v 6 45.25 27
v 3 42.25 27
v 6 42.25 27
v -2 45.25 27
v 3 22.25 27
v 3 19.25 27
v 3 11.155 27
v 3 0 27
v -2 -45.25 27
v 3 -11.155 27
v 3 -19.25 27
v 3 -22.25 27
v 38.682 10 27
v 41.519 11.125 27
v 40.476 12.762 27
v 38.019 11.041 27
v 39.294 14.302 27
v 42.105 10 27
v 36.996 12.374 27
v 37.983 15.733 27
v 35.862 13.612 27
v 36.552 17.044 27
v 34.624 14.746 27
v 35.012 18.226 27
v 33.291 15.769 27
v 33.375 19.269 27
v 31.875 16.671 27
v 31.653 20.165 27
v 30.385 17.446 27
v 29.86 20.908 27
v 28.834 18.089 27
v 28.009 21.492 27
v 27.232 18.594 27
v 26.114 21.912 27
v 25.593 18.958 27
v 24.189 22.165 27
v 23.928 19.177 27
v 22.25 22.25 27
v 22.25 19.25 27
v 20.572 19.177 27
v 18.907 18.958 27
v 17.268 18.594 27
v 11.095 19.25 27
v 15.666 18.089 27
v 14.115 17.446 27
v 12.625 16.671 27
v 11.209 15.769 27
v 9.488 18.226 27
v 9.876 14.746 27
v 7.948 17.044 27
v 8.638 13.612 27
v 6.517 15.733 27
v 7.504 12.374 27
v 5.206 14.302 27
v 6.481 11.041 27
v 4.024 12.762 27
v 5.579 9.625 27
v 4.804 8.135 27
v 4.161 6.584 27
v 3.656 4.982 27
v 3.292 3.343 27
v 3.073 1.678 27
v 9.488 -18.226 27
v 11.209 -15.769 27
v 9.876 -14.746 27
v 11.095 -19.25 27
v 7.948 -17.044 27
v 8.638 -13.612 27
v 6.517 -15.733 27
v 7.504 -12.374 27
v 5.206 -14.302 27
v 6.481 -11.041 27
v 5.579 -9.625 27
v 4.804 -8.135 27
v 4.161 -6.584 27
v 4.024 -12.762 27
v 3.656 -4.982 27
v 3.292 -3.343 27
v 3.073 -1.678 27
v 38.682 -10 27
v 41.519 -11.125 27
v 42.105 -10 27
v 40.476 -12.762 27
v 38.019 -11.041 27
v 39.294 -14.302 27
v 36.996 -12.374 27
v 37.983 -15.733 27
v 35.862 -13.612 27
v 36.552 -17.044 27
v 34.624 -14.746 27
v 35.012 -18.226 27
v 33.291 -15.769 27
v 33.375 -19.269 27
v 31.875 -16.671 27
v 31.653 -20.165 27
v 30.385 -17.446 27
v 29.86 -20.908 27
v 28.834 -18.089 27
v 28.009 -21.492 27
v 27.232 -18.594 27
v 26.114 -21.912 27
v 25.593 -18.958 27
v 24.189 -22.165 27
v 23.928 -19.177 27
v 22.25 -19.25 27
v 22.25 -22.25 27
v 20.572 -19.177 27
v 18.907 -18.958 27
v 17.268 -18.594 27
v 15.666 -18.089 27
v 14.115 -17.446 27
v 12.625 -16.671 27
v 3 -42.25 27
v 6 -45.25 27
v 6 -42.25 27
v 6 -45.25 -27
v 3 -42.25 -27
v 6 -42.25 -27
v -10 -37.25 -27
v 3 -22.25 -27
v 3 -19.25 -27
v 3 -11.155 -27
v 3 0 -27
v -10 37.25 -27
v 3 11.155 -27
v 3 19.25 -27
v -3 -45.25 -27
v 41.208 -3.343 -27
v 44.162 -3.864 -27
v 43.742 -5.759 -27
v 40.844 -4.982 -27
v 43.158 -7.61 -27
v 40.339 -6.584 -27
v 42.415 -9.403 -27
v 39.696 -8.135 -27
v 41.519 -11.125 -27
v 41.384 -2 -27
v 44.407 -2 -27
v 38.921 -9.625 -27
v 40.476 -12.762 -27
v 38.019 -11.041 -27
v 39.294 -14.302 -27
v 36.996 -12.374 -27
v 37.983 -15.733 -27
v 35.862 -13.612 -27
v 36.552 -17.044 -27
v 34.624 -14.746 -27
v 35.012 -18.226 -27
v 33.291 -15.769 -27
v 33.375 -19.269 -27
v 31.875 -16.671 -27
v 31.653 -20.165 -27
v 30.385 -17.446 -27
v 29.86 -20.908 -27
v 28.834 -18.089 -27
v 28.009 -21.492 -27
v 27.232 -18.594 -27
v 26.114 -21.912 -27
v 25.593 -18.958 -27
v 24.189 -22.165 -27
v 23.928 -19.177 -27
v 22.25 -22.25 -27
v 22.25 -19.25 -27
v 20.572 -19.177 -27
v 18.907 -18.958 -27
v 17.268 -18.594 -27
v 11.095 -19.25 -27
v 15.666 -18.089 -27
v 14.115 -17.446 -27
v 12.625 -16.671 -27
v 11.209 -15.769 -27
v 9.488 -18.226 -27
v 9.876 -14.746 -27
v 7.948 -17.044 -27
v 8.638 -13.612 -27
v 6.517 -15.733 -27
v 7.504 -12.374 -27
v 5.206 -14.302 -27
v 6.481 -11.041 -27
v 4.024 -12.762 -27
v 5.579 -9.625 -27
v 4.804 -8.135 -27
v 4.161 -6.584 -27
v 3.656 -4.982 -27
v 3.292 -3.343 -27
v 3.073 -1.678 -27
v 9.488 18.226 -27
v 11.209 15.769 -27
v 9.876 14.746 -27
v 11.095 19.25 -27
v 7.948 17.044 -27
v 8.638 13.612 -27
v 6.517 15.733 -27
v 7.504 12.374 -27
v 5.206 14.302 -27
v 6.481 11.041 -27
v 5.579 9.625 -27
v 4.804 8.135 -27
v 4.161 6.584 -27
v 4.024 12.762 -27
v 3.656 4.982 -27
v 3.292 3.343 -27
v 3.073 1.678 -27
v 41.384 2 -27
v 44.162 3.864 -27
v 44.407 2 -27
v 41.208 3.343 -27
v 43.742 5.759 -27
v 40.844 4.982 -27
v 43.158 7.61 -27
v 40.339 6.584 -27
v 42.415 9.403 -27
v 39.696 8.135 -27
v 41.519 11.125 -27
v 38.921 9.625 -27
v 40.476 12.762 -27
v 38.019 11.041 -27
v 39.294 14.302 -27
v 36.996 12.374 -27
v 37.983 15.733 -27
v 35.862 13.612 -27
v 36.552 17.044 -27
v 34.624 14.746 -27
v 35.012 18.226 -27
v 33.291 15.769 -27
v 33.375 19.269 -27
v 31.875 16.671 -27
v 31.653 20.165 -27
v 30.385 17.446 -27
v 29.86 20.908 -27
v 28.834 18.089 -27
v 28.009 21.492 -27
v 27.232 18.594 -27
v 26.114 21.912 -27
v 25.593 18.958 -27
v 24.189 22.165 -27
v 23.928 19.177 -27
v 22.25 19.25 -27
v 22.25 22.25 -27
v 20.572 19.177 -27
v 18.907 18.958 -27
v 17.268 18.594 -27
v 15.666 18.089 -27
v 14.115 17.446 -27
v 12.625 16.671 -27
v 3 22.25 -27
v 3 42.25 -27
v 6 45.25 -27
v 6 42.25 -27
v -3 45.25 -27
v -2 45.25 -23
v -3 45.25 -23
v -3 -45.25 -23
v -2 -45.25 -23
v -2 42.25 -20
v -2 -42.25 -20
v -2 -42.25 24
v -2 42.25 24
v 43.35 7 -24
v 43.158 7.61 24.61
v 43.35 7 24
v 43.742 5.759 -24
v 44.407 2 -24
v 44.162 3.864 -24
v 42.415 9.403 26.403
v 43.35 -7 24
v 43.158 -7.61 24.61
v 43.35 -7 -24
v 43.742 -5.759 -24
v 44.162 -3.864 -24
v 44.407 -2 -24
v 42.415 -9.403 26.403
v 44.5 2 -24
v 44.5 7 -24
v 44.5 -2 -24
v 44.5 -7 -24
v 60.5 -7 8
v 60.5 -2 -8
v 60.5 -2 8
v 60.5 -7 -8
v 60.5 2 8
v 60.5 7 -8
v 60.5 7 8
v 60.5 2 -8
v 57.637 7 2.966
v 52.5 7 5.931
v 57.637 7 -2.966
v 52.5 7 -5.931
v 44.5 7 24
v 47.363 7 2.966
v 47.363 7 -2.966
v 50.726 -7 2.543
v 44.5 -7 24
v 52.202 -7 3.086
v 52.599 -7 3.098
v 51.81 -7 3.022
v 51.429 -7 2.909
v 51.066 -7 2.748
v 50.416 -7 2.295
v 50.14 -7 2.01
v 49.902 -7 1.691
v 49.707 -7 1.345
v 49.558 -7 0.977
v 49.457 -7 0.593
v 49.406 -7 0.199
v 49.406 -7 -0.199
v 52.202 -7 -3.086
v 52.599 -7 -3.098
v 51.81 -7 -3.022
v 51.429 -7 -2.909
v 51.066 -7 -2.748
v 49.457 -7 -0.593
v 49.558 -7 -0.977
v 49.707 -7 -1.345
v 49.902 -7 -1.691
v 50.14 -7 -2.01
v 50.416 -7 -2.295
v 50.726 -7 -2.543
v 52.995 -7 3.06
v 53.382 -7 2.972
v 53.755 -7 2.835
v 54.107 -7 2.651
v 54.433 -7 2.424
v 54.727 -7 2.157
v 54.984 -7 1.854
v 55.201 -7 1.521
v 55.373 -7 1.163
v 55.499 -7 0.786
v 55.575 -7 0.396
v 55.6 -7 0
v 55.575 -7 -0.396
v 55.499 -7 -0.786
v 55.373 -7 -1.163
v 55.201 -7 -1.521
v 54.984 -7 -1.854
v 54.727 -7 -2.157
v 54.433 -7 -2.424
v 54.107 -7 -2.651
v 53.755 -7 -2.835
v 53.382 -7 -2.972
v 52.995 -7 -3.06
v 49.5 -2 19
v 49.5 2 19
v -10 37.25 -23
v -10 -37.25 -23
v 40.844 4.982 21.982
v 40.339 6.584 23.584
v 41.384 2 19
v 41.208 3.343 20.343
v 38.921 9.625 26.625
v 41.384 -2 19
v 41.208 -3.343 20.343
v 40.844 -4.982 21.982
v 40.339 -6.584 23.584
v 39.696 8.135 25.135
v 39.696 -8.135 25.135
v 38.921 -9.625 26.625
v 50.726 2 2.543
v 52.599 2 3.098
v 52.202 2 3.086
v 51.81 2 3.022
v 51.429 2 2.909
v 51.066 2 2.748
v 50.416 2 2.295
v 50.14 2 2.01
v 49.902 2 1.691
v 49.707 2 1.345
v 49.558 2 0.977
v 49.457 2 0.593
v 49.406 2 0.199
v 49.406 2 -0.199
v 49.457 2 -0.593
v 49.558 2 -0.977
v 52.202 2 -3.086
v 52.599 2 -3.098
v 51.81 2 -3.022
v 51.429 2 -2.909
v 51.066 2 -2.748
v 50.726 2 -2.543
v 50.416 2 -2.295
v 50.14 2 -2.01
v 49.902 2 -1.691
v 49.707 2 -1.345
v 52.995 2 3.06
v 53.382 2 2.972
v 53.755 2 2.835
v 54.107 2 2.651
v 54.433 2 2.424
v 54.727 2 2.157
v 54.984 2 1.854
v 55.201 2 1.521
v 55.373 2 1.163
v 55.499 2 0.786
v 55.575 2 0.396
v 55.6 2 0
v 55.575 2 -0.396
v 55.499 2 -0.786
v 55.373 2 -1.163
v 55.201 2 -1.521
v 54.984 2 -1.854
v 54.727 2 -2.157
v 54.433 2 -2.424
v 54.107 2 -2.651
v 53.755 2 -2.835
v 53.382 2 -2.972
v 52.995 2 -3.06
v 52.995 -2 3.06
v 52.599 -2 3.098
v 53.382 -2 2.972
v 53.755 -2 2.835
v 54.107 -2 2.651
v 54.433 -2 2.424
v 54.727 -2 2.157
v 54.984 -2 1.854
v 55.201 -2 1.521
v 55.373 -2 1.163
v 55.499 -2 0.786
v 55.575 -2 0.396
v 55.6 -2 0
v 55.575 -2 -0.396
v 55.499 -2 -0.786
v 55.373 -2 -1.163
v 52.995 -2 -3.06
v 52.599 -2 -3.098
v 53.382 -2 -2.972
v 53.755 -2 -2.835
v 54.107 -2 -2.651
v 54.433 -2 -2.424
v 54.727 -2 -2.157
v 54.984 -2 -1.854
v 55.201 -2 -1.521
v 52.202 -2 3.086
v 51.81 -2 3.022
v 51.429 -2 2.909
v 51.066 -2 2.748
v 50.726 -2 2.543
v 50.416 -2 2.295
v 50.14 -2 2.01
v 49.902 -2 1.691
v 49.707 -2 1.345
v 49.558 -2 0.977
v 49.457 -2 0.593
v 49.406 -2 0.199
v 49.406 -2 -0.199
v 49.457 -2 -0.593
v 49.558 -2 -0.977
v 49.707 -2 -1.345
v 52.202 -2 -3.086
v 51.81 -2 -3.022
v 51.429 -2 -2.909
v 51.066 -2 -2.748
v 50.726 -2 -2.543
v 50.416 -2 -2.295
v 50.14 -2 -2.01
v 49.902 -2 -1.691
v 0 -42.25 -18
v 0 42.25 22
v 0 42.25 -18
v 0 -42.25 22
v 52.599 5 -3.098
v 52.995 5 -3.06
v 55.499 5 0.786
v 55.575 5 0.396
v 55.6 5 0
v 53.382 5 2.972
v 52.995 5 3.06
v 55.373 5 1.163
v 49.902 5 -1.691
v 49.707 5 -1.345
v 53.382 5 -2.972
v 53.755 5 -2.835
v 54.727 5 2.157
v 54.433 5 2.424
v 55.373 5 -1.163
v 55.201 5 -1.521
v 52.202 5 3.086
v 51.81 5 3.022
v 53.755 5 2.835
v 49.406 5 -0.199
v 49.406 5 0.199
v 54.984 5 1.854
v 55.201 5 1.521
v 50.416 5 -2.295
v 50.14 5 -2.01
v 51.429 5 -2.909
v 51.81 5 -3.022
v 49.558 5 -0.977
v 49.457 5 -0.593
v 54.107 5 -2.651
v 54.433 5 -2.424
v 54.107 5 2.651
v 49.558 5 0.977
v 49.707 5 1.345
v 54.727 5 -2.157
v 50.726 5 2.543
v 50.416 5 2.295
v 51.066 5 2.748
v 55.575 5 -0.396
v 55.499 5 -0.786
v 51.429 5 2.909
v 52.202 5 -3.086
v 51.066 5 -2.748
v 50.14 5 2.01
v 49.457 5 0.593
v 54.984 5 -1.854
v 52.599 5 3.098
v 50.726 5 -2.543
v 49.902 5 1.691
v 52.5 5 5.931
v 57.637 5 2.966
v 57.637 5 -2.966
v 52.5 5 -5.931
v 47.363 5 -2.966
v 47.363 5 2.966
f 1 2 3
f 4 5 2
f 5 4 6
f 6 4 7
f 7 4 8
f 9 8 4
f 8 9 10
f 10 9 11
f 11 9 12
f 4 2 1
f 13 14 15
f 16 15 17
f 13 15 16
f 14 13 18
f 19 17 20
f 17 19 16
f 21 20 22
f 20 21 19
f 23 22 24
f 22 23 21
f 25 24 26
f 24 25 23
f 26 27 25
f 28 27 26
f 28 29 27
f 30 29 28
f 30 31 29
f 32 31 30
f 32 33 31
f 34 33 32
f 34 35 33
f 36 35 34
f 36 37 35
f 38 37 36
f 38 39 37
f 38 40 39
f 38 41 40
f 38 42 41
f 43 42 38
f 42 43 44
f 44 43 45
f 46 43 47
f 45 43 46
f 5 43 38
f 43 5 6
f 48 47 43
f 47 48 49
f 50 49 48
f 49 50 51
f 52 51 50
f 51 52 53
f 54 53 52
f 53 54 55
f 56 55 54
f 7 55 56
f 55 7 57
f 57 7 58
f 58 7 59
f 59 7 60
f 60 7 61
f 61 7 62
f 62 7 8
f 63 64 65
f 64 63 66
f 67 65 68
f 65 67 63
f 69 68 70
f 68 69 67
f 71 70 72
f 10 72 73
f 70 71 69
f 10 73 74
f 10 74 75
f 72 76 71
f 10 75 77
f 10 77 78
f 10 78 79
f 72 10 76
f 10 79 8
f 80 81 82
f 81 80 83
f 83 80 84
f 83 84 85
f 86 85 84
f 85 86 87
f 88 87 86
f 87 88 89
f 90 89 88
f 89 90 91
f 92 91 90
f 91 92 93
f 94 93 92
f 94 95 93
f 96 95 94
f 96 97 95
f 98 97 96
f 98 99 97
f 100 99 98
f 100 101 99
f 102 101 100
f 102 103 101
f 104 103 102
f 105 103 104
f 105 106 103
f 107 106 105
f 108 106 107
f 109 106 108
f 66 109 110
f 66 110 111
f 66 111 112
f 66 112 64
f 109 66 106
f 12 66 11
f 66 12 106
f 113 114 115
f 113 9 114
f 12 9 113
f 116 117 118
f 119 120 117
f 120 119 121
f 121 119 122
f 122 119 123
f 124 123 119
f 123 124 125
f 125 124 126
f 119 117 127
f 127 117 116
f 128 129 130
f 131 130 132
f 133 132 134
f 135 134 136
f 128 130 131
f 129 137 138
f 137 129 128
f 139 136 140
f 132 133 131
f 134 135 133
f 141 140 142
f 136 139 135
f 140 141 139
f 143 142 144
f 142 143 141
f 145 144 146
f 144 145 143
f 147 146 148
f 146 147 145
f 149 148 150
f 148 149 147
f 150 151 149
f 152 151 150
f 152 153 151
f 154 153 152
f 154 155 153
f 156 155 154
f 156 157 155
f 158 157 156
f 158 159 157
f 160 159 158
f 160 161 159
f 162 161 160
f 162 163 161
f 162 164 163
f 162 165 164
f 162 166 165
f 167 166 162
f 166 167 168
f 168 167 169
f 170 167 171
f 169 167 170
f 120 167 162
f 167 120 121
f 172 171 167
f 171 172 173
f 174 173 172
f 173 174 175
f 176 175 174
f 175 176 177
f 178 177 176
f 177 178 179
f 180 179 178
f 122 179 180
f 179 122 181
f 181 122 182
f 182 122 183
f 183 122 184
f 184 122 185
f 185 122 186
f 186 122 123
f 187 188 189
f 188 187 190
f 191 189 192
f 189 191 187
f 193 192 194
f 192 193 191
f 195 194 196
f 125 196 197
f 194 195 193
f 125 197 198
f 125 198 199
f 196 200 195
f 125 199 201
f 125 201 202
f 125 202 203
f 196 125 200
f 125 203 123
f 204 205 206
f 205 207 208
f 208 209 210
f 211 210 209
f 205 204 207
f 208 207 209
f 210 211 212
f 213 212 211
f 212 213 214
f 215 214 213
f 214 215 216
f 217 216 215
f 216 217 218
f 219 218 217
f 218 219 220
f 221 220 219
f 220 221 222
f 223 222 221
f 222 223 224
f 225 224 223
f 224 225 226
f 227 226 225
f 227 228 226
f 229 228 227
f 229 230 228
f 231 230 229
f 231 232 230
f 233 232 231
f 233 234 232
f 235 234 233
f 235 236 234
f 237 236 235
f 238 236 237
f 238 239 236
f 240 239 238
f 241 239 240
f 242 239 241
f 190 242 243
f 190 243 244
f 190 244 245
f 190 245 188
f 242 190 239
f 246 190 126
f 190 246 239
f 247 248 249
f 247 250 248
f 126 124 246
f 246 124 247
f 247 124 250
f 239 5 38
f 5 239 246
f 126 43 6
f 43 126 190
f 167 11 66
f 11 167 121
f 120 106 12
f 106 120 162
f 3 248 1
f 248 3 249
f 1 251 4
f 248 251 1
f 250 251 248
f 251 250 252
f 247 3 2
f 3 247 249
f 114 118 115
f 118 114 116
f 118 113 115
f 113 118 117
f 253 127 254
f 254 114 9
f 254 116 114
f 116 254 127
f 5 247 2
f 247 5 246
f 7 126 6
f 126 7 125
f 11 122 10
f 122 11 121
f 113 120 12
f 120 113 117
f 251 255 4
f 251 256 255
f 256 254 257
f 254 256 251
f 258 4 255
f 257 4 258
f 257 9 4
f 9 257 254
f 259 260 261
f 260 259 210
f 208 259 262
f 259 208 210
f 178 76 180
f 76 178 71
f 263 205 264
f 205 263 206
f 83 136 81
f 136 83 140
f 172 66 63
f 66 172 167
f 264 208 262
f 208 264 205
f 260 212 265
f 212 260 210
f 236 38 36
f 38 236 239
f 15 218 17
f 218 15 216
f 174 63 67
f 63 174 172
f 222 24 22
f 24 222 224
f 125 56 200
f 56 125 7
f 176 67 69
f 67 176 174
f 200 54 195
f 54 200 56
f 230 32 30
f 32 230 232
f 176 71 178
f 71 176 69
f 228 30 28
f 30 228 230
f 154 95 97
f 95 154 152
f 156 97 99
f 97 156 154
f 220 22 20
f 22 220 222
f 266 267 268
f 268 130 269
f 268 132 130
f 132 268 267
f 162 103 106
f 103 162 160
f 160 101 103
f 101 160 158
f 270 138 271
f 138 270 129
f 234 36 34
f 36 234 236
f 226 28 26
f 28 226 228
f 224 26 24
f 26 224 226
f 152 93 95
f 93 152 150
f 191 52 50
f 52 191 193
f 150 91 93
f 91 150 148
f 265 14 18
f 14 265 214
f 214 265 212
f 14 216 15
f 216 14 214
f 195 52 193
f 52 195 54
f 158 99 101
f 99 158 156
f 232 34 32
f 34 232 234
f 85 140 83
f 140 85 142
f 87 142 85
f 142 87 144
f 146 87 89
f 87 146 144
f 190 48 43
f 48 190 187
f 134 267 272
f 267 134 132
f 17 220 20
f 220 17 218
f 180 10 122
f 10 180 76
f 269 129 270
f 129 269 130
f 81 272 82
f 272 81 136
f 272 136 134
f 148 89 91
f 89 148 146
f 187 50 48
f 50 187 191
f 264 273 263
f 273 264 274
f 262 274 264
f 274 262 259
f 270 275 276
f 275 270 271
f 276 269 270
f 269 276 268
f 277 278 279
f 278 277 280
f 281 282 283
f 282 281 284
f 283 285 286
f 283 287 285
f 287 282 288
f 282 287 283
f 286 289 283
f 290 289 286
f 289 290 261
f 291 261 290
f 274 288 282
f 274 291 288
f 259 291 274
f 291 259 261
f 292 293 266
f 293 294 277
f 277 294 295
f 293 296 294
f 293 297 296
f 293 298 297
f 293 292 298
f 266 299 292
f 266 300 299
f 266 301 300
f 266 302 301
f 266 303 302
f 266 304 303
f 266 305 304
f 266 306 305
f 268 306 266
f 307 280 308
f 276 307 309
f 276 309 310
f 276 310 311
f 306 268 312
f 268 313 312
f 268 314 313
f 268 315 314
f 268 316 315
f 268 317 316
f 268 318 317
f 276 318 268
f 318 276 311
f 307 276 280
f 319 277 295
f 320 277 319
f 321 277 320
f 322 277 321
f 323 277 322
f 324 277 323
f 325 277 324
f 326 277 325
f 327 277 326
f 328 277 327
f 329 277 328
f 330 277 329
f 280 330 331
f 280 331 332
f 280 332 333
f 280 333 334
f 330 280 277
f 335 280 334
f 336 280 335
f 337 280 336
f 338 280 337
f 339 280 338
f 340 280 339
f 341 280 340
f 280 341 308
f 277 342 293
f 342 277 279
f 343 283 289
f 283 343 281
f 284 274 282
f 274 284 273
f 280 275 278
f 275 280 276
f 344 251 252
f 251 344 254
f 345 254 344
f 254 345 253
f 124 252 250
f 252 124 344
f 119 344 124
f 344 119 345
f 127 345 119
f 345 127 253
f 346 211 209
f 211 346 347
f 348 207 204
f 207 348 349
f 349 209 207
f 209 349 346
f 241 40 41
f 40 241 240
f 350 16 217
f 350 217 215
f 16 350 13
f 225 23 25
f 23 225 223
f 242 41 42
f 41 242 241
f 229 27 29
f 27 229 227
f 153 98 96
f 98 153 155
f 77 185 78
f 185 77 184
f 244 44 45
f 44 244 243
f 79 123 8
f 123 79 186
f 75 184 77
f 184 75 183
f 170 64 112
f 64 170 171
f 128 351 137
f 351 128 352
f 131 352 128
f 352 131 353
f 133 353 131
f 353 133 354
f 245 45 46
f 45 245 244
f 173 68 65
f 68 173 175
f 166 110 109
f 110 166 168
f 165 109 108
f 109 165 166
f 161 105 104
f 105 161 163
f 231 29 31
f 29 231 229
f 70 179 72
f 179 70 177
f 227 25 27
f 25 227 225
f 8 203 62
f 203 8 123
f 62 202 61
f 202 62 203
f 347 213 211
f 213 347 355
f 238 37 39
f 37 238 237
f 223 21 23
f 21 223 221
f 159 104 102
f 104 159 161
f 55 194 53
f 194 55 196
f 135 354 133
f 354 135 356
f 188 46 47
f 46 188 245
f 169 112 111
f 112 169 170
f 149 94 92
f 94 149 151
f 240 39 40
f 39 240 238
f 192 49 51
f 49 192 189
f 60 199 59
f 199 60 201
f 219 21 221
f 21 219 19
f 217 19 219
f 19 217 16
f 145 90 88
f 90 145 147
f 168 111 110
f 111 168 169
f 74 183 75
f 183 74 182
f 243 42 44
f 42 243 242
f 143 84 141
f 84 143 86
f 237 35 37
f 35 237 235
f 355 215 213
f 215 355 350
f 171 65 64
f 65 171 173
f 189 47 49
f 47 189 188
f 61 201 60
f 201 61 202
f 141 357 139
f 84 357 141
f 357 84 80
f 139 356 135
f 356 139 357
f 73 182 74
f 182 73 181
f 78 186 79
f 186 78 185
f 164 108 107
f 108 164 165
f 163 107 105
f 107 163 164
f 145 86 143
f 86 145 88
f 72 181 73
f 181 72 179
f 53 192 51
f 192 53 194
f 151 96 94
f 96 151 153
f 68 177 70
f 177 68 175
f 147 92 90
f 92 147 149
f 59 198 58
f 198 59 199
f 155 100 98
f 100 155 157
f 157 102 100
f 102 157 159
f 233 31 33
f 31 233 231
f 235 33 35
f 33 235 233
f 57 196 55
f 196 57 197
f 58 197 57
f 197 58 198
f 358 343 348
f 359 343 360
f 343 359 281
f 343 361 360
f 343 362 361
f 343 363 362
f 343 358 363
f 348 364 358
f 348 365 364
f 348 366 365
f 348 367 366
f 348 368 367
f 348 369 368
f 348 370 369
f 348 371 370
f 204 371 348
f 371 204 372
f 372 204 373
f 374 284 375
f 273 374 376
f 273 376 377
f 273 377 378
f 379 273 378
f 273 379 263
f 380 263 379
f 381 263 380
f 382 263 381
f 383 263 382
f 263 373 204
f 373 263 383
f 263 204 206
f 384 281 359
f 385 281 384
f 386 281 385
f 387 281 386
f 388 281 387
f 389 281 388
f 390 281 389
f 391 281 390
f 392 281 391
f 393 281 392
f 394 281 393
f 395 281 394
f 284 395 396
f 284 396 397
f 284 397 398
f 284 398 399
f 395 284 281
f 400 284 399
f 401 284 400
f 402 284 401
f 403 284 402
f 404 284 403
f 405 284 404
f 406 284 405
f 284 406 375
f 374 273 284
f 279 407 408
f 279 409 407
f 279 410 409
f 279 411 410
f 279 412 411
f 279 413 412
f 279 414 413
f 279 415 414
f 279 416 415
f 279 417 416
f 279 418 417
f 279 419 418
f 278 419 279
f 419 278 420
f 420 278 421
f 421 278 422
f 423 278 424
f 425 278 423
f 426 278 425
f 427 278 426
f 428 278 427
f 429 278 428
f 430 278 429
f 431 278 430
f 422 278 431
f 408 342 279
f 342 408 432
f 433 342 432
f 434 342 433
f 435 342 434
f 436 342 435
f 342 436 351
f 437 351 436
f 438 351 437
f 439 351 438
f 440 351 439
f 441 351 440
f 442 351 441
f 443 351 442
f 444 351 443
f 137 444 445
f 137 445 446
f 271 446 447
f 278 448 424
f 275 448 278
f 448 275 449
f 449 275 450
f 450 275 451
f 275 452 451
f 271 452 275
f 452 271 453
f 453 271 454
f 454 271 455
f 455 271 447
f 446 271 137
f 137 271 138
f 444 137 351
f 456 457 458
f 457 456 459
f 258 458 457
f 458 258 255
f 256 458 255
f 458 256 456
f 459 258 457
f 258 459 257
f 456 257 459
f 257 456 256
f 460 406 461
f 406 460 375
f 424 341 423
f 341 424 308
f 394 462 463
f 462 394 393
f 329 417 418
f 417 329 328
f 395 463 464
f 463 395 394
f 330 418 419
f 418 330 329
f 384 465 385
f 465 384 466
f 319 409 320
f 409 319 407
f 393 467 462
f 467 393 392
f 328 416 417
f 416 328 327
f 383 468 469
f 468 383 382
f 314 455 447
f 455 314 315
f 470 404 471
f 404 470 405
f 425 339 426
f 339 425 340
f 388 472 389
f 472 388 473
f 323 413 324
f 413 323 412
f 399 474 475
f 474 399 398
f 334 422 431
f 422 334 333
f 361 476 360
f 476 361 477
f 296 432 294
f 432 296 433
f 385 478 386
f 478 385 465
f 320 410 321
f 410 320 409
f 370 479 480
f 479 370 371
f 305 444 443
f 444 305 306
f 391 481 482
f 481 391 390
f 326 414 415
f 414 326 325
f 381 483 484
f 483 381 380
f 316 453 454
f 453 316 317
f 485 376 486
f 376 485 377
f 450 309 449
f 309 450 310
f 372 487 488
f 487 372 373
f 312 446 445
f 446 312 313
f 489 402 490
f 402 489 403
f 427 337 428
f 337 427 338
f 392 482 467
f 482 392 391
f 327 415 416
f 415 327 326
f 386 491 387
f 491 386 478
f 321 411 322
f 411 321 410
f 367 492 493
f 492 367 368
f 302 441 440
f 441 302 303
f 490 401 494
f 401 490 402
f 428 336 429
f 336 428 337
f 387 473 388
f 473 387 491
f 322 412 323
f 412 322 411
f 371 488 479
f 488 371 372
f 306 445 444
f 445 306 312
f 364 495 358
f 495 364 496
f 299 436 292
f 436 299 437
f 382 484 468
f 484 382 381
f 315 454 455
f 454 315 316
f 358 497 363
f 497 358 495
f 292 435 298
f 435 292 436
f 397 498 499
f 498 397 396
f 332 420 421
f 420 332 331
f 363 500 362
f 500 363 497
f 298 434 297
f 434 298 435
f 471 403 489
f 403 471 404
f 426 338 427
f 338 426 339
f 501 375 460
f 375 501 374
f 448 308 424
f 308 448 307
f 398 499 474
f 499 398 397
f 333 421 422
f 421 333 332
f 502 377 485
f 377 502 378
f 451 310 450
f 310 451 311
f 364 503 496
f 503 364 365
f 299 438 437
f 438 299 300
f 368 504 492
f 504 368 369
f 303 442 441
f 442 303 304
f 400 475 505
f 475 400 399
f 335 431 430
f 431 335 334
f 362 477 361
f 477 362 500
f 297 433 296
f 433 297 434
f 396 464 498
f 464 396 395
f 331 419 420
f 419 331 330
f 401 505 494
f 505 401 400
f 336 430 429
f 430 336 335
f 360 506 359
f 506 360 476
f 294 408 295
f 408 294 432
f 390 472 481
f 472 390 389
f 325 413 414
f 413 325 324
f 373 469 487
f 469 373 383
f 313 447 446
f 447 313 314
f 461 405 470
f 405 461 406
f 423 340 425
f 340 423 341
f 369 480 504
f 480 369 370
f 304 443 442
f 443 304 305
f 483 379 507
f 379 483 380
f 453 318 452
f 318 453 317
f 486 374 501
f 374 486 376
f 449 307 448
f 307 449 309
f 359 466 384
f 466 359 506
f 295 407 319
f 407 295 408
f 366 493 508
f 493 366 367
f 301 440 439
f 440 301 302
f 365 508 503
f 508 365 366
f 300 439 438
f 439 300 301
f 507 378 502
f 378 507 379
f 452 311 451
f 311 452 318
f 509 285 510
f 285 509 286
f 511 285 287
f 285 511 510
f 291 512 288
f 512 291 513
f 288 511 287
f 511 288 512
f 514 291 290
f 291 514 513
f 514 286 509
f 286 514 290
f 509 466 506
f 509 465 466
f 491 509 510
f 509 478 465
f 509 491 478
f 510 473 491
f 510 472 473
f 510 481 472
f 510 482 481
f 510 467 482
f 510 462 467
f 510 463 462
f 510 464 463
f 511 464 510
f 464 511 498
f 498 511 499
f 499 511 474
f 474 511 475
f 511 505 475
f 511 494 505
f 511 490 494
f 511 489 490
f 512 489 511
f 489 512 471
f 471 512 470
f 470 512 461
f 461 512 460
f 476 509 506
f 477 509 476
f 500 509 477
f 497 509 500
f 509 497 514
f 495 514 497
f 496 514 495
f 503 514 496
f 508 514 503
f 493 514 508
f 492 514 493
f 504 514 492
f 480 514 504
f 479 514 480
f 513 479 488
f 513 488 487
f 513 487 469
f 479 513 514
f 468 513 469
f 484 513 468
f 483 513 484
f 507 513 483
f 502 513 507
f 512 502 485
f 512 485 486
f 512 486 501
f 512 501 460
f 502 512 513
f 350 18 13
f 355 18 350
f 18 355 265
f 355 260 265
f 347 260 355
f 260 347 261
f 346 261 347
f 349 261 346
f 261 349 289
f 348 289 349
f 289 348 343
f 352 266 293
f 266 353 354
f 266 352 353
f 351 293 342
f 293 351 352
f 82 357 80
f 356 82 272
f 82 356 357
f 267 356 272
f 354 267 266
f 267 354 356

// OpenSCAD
// [FL_INDEX: keywords="openscad, 3d_parametric, Umbrella_Holder_for_Balcony_Railings, csg_solid" | COT="Parametric OpenSCAD design from 3DCodeverse"]
// Title:  Umbrella Holder for Balcony Railings

// 2013 Lukas Süss aka mechadense
// License CC-BY-NC
// Umbrella holder





// Diameter of the umbrellas tube (+0.5mm)
dtube = 38.5;
//38;
rtube = dtube/2;

// Width of the bands used to fixate the holder onto one of the rectangular bars
wband = 20;

// hight of the rectangulat bar on which to mount the holder
sbar0 = 50;

// thickness of hook
shook = 4;

// depth of hook
dhook = 8;

sbar = sbar0+shook;
//50.5

//----

// baseplate thickness
tplate = 3.0;

// tubeholder thickness 
ttubewall = 3.0; // wall thickness of the pipe segment


// width of gap to adjust for tube diameter variations
adjustgap = 4;

// thickness of adjustment brackets
tadjust = 5;
// size of brackets
sadjust = 16;

// width of outer band guides
wrim = 3;

// hight of outer band guides
hrim = 3;


// resolution: minimum facet length
$fs=0.4;
// resolution: maximal facet angle
$fa=5;

// baseplate groovedepth for soft material
tinset = 2;

// total length of part
lges = dtube+2*ttubewall+2*wband+2*wrim;

// screw diameter
dscrew = 6;

// screw clearance
scrclr = 0.2;

// nut or screwhead wrench size
s = 10.1;



difference()
{
  union()
  {
    //Baseplate
    translate([tplate/2-tinset/2,0,0*sbar/2])
    cube([tplate+tinset,lges,sbar],center=true);
 
    //Tubeholder Basebody
    translate([(rtube+ttubewall),0,0])
      cylinder(r1=rtube+ttubewall,r2=rtube+ttubewall-0,h=sbar,center=true);

    // inner band guides and structural integrity
    translate([(rtube+ttubewall)/2,0,0])
    {
      translate([0,-tplate/2+(rtube+ttubewall),0])
        cube([(rtube+ttubewall),tplate,sbar],center=true);
      translate([0,-(-tplate/2+(rtube+ttubewall)),0])
        cube([(rtube+ttubewall),tplate,sbar],center=true);
    }
    // outer band guides
    translate([(tplate+hrim)/2,0,0])
    {
      translate([0,+(lges/2-wrim/2),0])
        cube([tplate+hrim,wrim,sbar],center=true);
      translate([0,-(lges/2-wrim/2),0])
        cube([tplate+hrim,wrim,sbar],center=true);
    }

    // base body for clamping bracket
    hull()
    {
      translate([(dtube+2*ttubewall)/2,0,0])
        cube([dtube+2*ttubewall,tadjust*2+adjustgap,3*sadjust],center=true);
      translate([(dtube+2*ttubewall+sadjust)/2,0,0])
        cube([dtube+2*ttubewall+sadjust,tadjust*2+adjustgap,sadjust],center=true);
    }
    hull()
    {
      translate([-dhook/2-tinset,0,-sbar/2+shook/2])
      cube([dhook,lges-2*dhook,shook],center=true);

      translate([-1/2-tinset,0,-sbar/2+shook/2])
      cube([1,lges,shook],center=true);
    }
  }

  //Tube holder cut
  translate([(rtube+ttubewall),0,0])
    cylinder(r=rtube,h=sbar*1.2,center=true);

  // adjustment gap cutter
  translate([dtube*1.5,0,0])
    cube([dtube,adjustgap,sbar*1.2],center=true);

  // inset cutter
  translate([0,0,shook/2])
  hull()
  {
    translate([-(tinset+1)/2,0,0])
    cube([tinset+1,lges-2*wrim,sbar0-2*wrim-2*tinset],center=true);

    translate([-1/2-tinset,0,0])
    cube([1,lges-2*wrim,sbar0-2*wrim],center=true);
  }

  // clamp screwhole
  // asserted: clampthickness < smaller tubeholder
  translate([dtube+2*ttubewall+sadjust/2,0,0]) rotate(90,[1,0,0])
    cylinder(r=dscrew/2+scrclr/2,h=dtube,center=true);
  // add hex inset for nut!
  translate([dtube+2*ttubewall+sadjust/2,adjustgap/2+tadjust-2,0]) // <<<<< 
    rotate(30,[0,1,0]) rotate(-90,[1,0,0])
    cylinder(r=s/2/cos(30)+scrclr/2,h=dtube,$fn=6,center=false);

 
  //several material saving cuts
  /*
  translate([0,+rtube*0.61803,0]) cuts1();
  translate([0,-rtube*0.61803,0]) cuts1();
  */
  translate([+rtube,0,+sbar/2]) rotate(90,[0,1,0])
    cylinder(r=10,h=dtube*1.5,$fn=4);
  //translate([+rtube,0,-sbar/2]) rotate(90,[0,1,0])
  //  cylinder(r=10,h=dtube*1.5,$fn=4);

  //translate([0,lges/2+1,0]) cuts2(20);
  //translate([0,-(lges/2+1),0]) cuts2(20);
}

module cuts1()
{
  translate([0,0,-0.05])
    cylinder(r1=sbar/8*1.6,r2=0,h=sbar/4*1.4,$fn=4);
    translate([0,0,+0.05]) scale([1,1,-1])
    cylinder(r1=sbar/8*1.6,r2=0,h=sbar/4*1.4,$fn=4);

}

module cuts2(s)
{
  hull()
  {
    cube([20,2,sbar*0.75],center=true);
    cube([20,2+s,sbar*0.75-1.5*s],center=true);
  }
}
